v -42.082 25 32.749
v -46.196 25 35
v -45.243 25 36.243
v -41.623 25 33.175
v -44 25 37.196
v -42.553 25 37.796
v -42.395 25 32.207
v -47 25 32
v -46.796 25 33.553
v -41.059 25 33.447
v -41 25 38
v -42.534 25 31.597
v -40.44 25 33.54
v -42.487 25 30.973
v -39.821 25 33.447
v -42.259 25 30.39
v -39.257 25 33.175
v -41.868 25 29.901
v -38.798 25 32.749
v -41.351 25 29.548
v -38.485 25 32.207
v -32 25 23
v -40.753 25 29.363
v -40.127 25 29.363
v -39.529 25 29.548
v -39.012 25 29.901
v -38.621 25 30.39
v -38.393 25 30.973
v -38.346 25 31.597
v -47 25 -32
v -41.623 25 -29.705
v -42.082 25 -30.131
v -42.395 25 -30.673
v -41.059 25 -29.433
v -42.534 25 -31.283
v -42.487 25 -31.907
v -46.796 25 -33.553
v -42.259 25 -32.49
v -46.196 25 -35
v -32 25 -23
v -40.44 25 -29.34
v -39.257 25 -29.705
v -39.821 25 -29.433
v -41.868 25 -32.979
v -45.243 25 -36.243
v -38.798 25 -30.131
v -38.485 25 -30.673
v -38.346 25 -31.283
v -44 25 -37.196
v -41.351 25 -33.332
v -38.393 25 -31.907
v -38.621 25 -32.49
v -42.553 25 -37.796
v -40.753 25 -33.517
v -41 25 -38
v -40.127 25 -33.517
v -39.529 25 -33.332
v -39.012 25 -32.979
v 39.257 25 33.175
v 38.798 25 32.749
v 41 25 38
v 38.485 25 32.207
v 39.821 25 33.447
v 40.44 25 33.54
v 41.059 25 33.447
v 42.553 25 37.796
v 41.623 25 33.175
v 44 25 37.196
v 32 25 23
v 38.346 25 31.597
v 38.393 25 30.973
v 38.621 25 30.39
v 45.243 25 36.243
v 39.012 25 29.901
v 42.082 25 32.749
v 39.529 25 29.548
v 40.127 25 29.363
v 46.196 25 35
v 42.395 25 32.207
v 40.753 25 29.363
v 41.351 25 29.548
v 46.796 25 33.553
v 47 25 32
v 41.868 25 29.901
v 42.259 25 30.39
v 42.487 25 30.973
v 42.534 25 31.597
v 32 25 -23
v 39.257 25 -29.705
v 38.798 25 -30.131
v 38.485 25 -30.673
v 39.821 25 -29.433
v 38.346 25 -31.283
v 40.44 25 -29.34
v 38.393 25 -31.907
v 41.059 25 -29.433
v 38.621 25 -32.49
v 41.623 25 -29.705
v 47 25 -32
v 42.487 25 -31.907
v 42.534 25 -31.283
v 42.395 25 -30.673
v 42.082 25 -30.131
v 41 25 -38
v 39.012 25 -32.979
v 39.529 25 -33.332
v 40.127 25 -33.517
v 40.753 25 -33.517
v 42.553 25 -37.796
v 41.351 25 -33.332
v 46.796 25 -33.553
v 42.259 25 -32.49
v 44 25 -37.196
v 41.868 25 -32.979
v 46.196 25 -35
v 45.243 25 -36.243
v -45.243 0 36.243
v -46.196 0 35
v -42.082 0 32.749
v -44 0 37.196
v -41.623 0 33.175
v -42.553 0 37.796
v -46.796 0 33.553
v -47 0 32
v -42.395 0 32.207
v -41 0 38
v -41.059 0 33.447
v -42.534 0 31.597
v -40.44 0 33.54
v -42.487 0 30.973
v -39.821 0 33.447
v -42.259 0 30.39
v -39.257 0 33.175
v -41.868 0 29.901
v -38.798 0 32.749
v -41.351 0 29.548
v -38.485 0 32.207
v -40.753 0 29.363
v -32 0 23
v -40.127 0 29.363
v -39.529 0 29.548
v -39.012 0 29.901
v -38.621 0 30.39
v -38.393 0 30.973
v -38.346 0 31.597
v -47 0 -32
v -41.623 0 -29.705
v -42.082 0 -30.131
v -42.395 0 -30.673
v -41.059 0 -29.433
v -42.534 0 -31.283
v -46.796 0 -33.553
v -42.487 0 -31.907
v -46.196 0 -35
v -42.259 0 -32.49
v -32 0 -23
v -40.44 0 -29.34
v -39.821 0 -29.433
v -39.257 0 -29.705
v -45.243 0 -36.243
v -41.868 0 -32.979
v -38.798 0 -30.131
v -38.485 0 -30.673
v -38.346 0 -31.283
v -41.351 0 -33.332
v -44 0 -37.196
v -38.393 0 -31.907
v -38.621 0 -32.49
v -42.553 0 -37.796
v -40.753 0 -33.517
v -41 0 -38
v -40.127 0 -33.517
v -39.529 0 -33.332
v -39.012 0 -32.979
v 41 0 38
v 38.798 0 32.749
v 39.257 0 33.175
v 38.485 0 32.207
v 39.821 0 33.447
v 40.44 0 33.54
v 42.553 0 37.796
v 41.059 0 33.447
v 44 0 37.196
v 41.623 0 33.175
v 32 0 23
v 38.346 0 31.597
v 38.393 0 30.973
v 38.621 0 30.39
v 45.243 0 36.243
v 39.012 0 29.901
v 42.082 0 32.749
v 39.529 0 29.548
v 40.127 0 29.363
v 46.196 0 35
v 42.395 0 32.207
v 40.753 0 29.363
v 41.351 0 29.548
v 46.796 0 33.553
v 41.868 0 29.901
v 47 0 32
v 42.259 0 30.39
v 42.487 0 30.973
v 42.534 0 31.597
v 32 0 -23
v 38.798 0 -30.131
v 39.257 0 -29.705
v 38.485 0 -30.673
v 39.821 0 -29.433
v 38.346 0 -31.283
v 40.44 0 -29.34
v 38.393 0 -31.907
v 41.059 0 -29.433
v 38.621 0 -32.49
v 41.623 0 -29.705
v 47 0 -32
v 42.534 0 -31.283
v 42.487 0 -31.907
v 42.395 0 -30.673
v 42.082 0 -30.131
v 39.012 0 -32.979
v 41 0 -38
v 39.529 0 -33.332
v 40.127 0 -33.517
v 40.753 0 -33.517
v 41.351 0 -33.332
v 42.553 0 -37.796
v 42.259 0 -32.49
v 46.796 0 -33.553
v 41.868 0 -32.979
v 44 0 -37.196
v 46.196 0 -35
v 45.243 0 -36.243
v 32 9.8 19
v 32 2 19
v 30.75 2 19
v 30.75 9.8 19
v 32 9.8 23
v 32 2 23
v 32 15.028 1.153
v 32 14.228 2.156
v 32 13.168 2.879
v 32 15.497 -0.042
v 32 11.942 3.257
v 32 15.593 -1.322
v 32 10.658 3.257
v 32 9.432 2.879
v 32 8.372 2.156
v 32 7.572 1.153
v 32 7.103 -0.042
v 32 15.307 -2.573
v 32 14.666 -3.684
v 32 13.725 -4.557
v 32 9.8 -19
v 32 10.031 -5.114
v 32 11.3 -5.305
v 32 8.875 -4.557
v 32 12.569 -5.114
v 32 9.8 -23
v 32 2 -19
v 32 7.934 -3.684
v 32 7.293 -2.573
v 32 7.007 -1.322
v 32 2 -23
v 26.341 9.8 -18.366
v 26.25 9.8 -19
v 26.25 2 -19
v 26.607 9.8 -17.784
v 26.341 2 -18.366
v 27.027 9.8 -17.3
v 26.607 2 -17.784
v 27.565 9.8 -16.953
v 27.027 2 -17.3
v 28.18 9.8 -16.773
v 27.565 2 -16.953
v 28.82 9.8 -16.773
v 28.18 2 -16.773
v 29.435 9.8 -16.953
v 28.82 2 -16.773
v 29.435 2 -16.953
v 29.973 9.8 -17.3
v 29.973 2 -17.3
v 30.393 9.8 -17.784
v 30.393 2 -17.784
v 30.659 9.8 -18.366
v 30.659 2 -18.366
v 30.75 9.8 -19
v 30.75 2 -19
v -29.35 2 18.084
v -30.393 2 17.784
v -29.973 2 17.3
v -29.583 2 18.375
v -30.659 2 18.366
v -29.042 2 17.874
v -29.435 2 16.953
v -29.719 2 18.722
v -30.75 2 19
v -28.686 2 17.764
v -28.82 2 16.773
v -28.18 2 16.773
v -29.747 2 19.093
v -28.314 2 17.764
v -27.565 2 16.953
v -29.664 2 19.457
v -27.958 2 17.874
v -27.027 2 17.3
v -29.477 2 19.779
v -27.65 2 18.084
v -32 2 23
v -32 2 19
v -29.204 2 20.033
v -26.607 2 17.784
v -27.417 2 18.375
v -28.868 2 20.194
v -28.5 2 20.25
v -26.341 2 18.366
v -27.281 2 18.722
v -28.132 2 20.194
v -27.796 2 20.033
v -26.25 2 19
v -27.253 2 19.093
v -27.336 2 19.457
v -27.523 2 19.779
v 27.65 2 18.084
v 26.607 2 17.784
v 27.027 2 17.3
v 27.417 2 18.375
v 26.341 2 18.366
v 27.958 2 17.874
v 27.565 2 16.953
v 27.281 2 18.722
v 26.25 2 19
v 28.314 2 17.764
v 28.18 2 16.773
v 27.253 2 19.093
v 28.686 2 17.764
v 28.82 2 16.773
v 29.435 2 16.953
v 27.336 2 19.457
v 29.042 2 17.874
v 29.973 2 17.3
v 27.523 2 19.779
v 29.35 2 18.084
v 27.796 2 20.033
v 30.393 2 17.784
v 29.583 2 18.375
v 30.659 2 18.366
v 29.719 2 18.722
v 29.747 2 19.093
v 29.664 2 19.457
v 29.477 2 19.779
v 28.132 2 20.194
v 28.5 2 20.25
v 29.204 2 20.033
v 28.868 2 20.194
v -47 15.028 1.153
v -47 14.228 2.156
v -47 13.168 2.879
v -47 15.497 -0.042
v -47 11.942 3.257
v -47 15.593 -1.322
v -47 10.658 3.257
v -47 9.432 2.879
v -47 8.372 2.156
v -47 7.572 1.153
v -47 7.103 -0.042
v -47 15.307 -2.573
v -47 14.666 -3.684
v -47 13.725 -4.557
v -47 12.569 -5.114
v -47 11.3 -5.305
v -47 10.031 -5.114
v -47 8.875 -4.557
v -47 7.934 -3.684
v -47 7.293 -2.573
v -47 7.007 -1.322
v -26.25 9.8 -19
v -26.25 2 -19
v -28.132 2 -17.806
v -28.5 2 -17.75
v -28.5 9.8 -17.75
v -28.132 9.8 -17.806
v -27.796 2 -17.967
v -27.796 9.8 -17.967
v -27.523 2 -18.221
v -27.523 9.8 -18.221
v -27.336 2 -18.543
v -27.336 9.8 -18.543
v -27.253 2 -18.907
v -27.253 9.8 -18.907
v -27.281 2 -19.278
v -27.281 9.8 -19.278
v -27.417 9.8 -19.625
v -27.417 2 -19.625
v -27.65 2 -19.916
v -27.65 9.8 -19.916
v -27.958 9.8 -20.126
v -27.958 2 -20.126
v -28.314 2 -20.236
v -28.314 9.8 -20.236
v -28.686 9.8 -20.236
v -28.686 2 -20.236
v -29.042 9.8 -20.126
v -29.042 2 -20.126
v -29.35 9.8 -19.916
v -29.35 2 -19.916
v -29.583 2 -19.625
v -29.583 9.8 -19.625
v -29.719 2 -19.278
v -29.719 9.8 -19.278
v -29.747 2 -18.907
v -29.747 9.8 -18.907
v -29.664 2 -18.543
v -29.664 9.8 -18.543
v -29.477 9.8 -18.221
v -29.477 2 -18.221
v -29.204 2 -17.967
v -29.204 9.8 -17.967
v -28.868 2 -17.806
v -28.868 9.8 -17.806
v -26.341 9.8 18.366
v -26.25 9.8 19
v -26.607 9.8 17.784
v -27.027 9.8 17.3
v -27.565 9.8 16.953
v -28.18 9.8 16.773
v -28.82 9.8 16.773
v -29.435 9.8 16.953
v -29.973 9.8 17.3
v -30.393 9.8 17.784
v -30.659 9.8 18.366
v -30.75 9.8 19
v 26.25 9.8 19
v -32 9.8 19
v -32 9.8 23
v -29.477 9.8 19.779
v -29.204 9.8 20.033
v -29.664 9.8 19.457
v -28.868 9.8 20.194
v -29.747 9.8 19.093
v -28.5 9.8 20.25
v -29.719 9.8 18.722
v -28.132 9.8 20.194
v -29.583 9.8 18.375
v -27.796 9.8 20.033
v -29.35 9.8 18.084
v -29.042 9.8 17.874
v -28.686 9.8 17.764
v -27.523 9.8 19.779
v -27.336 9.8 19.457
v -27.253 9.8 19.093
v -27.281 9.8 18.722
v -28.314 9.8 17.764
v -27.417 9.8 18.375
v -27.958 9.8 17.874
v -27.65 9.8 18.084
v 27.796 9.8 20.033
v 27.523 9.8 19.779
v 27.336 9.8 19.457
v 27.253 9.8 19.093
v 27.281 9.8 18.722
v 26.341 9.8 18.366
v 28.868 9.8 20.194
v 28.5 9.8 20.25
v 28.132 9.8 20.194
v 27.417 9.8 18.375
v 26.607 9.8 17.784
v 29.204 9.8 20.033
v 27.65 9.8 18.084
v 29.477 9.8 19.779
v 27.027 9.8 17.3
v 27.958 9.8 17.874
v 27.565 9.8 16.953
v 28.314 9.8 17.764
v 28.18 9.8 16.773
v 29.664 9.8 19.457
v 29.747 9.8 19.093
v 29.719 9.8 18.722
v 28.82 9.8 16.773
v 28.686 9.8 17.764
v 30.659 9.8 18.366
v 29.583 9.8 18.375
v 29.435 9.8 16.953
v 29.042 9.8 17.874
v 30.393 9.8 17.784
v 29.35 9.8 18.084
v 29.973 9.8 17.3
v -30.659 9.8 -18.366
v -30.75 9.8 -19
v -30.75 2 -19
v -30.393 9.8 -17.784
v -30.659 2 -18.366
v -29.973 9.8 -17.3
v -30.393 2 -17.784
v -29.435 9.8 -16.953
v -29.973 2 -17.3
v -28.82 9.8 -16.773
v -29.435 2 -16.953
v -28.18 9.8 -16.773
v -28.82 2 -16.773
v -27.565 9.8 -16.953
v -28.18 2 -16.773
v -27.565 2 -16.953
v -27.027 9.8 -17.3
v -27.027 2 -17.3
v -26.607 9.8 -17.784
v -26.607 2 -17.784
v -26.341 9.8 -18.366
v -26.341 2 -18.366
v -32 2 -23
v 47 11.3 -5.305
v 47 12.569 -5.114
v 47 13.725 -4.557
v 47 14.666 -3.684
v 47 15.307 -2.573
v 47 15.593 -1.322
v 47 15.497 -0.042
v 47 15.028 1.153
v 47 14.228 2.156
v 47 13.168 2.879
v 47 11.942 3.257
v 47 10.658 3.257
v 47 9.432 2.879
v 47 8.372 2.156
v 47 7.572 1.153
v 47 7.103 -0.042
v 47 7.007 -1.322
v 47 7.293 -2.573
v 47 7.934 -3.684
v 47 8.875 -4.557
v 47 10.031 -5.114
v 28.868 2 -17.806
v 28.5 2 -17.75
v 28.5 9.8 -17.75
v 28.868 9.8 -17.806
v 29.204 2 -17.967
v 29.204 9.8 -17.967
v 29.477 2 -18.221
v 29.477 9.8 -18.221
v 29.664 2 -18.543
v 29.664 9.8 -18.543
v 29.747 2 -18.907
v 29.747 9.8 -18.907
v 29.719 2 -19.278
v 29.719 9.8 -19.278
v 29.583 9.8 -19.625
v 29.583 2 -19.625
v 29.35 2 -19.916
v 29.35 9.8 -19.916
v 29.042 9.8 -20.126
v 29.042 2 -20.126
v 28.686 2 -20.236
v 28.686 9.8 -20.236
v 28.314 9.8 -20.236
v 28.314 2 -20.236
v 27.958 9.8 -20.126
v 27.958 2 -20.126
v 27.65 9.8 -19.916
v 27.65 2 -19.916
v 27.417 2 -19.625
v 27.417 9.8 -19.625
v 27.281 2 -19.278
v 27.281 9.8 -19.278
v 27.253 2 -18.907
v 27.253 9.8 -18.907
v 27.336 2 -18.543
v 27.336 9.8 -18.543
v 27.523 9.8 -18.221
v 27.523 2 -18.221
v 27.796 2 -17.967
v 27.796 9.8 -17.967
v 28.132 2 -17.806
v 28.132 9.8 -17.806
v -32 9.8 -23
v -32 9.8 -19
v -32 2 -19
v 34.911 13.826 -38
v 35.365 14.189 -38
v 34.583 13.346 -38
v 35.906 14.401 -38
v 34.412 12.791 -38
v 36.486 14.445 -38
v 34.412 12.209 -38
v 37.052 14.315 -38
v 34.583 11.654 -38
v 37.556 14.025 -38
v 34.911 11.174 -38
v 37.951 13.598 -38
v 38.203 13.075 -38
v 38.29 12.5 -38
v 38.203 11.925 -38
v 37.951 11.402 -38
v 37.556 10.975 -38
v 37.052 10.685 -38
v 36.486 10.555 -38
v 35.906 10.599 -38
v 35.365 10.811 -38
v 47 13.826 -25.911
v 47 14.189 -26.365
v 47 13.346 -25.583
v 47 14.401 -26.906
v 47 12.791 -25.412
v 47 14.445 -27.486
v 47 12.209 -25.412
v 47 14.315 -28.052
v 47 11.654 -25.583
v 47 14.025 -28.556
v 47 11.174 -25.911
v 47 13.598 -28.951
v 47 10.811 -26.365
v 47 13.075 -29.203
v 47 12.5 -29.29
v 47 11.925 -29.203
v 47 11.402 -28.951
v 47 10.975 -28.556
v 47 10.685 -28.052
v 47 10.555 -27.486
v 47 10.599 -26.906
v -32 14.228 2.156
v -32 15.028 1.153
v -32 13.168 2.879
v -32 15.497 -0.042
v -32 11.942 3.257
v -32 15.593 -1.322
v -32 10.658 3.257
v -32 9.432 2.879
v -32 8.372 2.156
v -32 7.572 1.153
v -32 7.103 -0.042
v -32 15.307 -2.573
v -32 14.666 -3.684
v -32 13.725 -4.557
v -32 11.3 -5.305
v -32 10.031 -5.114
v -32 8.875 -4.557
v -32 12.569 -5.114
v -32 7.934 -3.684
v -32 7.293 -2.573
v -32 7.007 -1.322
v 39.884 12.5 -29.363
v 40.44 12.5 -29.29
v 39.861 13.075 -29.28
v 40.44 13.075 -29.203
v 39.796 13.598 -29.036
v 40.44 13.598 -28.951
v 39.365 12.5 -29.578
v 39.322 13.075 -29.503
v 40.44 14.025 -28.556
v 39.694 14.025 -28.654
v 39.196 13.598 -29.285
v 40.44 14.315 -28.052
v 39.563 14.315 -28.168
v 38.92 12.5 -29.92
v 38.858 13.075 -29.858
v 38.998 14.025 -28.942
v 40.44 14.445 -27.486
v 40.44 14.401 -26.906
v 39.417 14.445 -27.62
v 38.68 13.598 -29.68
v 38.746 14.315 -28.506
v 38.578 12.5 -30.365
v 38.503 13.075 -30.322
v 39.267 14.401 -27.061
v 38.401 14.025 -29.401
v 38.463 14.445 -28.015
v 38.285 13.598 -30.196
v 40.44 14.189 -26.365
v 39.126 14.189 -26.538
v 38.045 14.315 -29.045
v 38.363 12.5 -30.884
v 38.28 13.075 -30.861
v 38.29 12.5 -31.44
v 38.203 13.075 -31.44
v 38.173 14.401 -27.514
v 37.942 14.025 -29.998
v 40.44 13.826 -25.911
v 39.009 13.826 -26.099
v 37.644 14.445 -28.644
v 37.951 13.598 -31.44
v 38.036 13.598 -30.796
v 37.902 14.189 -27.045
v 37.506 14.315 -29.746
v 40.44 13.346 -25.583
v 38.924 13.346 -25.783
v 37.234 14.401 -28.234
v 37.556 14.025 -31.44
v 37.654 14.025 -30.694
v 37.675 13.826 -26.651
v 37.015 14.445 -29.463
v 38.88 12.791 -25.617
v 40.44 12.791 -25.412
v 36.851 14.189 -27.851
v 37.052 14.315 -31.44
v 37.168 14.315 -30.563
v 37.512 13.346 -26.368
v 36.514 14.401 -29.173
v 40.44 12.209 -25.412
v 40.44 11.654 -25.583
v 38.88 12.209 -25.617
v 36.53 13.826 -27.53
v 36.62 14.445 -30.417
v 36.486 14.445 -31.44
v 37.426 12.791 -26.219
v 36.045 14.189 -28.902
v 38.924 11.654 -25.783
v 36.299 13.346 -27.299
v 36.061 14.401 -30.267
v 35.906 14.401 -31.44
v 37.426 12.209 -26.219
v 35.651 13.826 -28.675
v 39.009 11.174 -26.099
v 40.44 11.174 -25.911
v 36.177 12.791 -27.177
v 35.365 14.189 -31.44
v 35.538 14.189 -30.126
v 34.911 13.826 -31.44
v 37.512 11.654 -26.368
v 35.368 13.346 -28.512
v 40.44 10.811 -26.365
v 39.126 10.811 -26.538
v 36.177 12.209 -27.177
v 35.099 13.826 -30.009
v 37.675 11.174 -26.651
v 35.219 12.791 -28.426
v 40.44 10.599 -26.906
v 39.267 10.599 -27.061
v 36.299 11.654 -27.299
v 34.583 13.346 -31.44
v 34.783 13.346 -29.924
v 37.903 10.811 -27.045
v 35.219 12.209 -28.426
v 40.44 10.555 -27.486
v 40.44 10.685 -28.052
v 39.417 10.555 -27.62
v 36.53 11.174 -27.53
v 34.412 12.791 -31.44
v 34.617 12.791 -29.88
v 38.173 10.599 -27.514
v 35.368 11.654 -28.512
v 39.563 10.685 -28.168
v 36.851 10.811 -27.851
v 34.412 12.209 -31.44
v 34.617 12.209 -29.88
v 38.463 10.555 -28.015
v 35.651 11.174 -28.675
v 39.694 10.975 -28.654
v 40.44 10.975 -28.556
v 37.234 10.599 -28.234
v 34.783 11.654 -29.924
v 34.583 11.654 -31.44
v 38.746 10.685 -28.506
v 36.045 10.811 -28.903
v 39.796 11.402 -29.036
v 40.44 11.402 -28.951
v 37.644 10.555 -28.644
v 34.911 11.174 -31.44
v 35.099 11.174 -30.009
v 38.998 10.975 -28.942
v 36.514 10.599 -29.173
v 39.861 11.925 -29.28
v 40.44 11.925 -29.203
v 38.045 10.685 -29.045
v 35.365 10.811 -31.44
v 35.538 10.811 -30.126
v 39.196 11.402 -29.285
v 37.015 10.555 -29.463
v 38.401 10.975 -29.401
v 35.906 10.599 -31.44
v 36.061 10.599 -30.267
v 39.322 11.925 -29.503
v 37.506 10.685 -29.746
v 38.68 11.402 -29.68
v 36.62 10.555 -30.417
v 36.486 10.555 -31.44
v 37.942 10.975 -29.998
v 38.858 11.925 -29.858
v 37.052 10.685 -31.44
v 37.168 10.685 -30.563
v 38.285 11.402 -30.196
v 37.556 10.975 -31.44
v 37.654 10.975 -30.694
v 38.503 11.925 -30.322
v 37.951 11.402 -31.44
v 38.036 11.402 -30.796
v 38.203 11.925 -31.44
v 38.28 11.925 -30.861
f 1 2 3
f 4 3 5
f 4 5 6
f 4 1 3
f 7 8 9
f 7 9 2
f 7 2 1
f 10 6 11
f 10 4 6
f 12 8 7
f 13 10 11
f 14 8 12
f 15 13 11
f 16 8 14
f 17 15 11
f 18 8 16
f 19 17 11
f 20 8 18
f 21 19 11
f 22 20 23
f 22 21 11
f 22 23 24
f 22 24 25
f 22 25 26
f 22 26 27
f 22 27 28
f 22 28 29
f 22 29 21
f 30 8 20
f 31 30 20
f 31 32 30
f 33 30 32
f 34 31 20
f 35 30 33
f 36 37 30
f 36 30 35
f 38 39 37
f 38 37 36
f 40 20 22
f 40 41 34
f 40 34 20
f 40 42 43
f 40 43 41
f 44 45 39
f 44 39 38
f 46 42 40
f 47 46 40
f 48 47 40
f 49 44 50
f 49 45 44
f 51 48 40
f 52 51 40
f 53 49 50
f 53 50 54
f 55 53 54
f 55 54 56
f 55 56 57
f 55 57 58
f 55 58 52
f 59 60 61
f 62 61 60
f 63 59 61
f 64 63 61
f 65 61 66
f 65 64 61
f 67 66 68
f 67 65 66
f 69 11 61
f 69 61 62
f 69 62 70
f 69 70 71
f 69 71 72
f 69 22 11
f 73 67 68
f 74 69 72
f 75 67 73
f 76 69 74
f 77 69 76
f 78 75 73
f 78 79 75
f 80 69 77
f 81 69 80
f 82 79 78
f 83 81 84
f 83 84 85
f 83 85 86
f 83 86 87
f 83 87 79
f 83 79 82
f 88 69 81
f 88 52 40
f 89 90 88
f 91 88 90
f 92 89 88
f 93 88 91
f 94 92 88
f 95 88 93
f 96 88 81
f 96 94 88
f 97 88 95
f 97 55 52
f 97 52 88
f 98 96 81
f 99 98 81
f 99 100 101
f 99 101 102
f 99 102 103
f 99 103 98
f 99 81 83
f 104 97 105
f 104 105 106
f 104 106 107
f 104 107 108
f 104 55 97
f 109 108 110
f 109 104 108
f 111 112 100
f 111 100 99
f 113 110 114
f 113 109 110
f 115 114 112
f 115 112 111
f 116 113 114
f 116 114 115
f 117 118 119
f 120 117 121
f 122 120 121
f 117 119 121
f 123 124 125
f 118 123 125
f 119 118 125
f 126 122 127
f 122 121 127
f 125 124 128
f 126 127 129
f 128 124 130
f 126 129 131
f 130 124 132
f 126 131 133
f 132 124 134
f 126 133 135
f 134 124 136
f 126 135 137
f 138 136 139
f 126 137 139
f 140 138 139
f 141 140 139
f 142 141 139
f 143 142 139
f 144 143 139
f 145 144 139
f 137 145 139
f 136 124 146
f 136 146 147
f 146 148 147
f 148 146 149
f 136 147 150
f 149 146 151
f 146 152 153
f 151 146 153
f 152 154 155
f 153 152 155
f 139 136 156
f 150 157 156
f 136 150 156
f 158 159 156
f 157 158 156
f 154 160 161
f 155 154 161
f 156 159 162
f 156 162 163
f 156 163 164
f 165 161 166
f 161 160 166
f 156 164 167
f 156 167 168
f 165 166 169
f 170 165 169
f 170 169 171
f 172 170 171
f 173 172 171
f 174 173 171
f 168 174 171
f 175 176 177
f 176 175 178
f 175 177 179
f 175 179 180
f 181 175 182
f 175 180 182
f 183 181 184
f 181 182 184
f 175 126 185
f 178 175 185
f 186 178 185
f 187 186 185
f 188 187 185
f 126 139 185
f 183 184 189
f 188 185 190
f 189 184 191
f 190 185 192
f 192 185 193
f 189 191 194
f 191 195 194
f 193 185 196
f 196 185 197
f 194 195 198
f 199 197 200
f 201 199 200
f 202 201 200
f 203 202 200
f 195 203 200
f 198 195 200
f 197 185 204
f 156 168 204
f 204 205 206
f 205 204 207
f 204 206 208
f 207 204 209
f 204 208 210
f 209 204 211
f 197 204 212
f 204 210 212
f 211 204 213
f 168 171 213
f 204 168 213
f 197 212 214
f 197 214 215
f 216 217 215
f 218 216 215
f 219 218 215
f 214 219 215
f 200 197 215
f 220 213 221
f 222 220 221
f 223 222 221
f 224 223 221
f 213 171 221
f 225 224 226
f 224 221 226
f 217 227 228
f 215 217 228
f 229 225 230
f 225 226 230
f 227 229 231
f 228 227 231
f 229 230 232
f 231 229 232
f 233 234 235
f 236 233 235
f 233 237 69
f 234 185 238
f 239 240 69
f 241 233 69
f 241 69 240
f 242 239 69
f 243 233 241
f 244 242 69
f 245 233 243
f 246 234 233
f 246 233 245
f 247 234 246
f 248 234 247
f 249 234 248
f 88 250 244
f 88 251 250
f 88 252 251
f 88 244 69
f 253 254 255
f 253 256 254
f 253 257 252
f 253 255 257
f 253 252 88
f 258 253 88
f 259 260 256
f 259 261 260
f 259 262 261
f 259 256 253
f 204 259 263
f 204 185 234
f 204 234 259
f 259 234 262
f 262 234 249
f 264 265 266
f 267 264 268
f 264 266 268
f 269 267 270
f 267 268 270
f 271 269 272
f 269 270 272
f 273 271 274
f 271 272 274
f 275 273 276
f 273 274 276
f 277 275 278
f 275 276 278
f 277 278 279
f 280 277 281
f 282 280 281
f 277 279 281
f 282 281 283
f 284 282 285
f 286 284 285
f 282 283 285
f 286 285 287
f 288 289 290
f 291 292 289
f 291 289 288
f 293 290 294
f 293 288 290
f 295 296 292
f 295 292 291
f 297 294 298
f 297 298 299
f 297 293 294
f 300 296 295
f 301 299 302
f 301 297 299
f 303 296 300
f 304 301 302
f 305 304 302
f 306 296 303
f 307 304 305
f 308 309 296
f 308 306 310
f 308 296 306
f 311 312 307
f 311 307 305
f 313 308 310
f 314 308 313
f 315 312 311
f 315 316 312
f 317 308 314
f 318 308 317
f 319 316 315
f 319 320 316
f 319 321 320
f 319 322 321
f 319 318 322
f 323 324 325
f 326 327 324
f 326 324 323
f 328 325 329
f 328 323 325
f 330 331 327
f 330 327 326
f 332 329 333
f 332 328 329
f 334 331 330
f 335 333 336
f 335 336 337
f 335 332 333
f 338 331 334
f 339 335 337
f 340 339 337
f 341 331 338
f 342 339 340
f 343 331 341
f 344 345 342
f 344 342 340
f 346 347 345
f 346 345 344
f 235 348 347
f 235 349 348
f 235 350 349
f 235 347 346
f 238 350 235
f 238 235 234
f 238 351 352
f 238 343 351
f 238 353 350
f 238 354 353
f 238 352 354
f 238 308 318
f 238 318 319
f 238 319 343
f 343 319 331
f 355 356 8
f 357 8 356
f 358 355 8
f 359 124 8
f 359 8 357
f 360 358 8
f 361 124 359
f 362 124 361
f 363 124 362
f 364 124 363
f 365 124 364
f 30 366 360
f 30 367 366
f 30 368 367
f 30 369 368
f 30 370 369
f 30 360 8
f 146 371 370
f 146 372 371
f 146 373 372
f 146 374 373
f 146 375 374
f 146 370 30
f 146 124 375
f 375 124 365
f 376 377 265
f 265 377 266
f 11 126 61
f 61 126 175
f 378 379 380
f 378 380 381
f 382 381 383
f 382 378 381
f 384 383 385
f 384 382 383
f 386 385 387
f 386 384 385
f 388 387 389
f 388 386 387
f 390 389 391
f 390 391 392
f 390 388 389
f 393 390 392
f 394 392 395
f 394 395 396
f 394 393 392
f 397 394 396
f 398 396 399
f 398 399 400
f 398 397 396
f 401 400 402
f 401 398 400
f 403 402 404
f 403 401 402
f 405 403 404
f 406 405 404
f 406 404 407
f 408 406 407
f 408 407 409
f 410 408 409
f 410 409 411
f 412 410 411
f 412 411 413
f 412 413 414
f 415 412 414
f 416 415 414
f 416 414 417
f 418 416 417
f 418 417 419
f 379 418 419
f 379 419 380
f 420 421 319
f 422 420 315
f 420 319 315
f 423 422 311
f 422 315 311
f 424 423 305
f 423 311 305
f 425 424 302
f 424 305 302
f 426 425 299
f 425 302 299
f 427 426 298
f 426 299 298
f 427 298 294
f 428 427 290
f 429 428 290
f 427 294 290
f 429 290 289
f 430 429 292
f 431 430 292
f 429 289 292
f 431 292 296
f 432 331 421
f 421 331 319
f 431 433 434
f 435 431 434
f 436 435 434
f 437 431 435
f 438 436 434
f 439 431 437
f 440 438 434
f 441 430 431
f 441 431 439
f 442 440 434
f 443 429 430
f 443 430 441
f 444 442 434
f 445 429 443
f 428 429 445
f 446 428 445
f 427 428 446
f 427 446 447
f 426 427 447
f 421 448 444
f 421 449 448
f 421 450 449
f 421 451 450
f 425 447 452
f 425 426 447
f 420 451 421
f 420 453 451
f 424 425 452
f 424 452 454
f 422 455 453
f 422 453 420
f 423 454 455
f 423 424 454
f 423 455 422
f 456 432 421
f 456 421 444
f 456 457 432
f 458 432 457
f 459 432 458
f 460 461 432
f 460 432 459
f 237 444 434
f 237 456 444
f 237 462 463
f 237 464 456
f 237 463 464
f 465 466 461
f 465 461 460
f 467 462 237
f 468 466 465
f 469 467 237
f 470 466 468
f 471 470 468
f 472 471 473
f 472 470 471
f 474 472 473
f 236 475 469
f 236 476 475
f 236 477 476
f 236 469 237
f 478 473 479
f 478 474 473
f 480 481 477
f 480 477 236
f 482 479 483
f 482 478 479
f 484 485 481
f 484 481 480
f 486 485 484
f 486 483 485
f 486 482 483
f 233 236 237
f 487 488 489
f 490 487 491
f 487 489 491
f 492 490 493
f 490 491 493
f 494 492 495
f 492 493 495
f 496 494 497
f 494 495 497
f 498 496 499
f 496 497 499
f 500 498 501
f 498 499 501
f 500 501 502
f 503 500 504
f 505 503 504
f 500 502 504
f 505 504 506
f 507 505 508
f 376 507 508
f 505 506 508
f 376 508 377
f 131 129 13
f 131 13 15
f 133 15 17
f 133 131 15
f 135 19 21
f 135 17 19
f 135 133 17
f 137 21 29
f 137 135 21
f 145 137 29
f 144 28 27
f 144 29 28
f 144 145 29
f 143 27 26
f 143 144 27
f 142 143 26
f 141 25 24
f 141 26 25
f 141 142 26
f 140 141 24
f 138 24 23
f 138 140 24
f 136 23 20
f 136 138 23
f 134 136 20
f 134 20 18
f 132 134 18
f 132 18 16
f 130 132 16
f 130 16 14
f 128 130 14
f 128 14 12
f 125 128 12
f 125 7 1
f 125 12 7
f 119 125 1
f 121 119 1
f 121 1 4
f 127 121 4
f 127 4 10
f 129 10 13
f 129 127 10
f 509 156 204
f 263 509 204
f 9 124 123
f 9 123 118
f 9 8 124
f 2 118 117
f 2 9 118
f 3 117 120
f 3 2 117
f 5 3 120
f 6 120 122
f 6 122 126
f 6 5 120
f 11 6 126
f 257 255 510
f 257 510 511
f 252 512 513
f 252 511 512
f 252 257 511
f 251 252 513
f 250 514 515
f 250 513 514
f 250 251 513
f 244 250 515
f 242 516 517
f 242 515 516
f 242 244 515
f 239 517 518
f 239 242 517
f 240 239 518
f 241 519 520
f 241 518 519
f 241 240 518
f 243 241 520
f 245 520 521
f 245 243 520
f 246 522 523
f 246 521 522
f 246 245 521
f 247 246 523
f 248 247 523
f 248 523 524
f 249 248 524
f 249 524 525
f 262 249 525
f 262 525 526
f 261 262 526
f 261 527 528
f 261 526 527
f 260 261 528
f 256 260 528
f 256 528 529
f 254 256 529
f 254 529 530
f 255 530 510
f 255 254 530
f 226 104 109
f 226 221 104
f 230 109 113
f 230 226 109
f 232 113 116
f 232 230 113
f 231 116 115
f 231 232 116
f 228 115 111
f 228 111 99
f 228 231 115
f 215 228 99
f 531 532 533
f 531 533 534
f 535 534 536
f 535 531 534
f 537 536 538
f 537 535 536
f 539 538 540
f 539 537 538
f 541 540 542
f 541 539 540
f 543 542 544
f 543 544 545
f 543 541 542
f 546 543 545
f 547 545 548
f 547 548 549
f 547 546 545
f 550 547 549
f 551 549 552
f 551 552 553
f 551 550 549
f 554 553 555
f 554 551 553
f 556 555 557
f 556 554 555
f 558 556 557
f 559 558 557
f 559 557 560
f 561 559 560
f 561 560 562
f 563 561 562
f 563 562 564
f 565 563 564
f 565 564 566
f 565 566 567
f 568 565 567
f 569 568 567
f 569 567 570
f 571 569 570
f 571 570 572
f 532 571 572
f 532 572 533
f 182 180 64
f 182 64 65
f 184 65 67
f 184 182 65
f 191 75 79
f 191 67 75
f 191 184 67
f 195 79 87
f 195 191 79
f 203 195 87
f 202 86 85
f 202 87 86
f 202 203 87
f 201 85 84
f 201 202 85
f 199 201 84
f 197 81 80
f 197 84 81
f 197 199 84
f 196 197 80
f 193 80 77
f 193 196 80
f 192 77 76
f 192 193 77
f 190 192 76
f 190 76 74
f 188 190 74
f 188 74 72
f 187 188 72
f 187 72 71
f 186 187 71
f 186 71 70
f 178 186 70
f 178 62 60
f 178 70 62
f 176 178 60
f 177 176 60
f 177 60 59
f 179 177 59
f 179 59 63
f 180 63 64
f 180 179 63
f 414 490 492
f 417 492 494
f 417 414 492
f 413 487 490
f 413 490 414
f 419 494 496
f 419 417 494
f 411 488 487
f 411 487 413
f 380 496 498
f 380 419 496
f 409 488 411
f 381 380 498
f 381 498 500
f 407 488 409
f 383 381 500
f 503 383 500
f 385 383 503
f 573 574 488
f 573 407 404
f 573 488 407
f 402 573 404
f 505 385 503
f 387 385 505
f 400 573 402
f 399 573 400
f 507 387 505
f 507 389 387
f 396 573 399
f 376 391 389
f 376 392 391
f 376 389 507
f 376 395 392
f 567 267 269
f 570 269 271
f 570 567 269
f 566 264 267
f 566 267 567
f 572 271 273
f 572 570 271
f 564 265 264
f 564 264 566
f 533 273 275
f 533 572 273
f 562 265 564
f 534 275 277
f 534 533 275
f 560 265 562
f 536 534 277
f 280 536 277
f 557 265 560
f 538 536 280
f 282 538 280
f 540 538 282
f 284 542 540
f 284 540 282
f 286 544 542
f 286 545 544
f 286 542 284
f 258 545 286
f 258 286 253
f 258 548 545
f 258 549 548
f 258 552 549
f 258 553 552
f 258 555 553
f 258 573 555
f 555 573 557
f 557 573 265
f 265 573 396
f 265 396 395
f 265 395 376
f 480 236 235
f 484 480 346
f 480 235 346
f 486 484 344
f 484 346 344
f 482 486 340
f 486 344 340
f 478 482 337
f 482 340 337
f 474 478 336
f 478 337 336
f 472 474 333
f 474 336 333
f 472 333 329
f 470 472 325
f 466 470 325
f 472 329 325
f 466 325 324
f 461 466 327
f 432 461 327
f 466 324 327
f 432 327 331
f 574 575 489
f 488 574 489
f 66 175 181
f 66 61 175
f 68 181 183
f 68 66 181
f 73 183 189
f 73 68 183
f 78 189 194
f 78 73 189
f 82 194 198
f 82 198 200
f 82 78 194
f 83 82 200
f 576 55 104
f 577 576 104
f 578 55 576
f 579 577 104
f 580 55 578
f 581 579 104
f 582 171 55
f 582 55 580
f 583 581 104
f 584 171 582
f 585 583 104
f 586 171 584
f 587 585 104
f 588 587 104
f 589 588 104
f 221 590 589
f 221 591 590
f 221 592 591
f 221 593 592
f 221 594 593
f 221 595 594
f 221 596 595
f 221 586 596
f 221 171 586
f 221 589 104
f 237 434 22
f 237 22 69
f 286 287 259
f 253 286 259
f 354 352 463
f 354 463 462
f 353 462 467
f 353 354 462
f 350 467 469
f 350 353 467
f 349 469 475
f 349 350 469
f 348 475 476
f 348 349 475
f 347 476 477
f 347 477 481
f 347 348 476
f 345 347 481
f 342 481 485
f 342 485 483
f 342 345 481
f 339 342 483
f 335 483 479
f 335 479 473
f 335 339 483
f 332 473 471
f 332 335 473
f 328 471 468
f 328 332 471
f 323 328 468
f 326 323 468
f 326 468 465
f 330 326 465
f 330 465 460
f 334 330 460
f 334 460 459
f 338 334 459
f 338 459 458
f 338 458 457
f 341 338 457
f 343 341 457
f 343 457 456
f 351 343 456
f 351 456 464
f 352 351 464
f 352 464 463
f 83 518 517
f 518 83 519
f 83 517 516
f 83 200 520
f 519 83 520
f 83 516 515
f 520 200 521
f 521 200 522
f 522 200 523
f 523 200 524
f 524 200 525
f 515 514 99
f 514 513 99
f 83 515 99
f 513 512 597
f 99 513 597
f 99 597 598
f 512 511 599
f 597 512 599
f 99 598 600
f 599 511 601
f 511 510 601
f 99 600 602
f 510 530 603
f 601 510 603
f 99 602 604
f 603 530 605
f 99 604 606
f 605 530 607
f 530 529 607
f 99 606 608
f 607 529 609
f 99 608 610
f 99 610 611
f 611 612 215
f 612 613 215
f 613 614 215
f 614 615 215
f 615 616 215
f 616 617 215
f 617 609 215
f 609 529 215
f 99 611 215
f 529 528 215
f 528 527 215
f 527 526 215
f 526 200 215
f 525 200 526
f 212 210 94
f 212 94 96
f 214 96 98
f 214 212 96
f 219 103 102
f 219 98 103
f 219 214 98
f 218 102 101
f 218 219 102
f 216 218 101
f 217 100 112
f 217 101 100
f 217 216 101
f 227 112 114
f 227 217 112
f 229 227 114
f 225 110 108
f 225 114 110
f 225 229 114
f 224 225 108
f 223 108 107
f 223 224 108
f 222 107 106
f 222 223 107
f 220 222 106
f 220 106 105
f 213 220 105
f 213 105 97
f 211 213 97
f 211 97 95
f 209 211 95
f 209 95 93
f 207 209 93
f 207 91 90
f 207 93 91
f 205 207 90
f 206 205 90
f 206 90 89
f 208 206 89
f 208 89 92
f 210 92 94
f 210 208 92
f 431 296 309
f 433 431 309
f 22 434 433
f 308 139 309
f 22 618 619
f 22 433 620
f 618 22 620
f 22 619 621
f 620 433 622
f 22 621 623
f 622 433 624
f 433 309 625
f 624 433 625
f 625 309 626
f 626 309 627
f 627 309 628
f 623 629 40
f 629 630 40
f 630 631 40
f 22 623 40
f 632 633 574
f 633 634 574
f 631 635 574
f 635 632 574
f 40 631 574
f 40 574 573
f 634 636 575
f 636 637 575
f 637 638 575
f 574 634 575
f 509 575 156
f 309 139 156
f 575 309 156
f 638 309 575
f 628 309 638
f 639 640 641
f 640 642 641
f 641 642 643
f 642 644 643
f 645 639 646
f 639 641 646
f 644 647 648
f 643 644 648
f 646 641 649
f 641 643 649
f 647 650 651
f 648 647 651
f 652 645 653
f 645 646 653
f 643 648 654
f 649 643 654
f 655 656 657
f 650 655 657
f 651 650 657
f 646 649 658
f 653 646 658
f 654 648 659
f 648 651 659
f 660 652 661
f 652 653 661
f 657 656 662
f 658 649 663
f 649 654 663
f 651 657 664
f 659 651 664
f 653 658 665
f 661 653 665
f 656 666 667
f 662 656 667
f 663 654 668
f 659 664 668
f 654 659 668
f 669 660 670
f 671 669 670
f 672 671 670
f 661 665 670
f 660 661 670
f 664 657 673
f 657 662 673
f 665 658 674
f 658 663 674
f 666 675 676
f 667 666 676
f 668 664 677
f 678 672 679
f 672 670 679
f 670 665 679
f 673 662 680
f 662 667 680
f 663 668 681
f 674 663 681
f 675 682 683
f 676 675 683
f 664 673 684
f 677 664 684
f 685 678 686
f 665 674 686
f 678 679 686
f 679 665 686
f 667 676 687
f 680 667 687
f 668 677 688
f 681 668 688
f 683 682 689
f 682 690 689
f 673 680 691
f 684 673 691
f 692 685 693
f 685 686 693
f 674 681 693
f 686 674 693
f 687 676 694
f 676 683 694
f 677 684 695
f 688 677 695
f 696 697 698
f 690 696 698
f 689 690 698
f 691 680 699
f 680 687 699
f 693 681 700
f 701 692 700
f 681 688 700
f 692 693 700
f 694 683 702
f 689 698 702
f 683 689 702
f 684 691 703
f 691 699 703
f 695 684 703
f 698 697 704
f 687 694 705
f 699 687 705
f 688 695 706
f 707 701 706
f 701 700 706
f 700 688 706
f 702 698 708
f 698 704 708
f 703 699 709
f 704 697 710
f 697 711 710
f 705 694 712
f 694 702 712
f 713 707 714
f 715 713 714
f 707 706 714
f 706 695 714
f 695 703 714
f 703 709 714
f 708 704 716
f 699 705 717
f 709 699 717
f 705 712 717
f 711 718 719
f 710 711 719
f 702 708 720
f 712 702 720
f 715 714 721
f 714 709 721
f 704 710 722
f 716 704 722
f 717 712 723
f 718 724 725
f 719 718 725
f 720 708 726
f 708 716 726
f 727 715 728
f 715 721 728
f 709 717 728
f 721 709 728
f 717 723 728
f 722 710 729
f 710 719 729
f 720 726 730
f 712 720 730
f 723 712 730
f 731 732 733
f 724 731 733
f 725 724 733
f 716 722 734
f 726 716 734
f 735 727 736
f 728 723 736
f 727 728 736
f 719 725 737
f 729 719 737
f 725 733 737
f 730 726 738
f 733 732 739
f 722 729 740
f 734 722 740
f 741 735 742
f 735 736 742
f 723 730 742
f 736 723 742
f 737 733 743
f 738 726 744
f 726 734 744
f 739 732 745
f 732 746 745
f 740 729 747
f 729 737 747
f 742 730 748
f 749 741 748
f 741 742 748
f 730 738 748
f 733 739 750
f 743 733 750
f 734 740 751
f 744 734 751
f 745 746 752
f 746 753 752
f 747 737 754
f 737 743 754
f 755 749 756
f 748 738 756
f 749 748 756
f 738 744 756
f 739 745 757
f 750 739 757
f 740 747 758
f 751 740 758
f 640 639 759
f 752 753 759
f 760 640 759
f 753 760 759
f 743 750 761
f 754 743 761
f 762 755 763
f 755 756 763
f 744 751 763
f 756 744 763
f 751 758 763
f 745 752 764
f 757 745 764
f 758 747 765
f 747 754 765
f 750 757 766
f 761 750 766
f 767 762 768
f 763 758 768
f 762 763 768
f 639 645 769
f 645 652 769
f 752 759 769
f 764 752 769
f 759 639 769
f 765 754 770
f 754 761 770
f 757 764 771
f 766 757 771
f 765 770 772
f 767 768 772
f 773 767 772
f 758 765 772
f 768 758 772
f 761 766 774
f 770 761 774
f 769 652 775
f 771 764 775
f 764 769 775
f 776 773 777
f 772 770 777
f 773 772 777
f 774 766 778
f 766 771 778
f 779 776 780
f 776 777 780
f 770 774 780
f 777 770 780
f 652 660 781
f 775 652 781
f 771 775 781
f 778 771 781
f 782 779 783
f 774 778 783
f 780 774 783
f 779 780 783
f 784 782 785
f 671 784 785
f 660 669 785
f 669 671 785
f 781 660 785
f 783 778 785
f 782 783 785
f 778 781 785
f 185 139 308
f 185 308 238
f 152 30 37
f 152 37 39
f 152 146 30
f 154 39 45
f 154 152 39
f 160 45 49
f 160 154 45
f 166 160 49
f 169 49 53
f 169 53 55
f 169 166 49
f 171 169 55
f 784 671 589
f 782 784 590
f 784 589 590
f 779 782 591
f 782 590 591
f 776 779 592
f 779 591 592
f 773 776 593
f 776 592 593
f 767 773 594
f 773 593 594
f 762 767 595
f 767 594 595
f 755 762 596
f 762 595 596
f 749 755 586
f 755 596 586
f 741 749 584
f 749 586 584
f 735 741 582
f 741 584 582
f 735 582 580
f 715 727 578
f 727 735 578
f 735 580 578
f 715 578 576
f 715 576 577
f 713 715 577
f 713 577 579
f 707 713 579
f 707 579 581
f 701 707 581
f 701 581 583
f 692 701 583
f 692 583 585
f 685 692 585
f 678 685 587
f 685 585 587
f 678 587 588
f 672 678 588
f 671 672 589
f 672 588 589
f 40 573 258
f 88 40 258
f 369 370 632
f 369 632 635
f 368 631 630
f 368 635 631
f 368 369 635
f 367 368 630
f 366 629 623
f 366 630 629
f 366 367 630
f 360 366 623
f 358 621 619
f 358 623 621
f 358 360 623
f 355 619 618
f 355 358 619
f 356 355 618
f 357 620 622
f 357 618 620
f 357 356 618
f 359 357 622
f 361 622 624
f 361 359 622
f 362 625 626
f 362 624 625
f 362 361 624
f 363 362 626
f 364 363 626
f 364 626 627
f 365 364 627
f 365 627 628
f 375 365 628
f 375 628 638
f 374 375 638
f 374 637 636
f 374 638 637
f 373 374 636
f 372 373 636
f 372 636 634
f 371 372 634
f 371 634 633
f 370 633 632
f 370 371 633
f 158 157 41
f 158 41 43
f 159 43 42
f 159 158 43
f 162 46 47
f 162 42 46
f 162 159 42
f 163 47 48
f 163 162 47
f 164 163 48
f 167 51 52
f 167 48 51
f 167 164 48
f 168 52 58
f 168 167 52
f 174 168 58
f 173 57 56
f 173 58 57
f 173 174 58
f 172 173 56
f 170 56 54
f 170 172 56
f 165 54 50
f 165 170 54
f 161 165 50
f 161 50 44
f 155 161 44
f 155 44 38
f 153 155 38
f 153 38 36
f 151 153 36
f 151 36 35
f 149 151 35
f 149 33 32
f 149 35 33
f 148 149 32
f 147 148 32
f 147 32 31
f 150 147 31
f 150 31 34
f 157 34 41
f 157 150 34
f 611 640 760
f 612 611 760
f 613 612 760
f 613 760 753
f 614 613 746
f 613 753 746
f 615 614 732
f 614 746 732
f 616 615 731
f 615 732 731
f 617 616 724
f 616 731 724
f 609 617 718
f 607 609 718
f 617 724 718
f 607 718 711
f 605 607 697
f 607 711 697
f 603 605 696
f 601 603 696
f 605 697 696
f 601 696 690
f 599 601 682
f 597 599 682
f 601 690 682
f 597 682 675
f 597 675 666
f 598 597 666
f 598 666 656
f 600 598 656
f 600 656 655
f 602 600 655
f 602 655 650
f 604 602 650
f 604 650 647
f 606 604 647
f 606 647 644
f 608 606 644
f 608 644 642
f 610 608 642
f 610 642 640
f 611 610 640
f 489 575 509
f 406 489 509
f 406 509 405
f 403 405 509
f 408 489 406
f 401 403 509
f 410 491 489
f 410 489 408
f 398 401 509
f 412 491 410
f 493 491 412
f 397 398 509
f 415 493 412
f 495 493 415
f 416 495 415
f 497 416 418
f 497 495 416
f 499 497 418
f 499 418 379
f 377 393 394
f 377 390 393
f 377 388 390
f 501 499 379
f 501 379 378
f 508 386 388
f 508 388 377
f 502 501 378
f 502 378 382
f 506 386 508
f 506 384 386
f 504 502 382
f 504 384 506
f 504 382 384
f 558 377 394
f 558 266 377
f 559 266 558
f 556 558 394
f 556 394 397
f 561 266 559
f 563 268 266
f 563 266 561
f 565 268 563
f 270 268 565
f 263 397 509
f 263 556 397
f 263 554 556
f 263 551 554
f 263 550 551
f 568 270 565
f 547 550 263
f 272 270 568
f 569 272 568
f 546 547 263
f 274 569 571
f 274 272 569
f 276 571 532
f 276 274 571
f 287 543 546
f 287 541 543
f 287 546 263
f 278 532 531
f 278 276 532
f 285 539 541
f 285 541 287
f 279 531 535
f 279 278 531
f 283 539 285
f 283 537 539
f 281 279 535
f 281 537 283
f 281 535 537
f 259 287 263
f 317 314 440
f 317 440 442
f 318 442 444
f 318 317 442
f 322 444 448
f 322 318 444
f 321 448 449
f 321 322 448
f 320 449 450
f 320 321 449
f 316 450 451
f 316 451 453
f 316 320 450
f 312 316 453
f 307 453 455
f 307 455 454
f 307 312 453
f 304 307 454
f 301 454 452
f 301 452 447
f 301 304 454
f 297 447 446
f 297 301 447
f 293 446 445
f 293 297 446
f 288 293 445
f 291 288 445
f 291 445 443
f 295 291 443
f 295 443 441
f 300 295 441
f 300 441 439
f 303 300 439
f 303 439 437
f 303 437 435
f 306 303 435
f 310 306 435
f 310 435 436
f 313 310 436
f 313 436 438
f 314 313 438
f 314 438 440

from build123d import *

# Parameters (mm, degrees)
SKETCH1_W               = 94
SKETCH1_H               = 76
SKETCH1_R               = 1.25
BOSS_EXTRUDE1_DEPTH     = 9.8
SKETCH2_W               = 94
SKETCH2_H               = 76
SKETCH2_W_2             = 64
SKETCH2_H_2             = 46
BOSS_EXTRUDE3_DEPTH     = 15.2
SKETCH3_W               = 64
SKETCH3_H               = 46
CUT_EXTRUDE1_DEPTH      = 2
CUT_EXTRUDE2_DEPTH      = 105.427008001
CUT_EXTRUDE2_DEPTH_BACK = 105.427008001
SKETCH4_R               = 4.305
CUT_EXTRUDE3_DEPTH      = 66.406421703
CUT_EXTRUDE3_DEPTH_BACK = 66.406421703
SKETCH5_R               = 2.1
FILLET1_R               = 6
CUT_SWEEP_PROFILE_R     = 1.95


with BuildPart() as part:
    # Sketch1 → Boss-Extrude1 (new body)
    with BuildSketch(Plane(origin=(0, 0, 0), x_dir=(1, 0, 0), z_dir=(0, 1, 0))):
        Rectangle(SKETCH1_W, SKETCH1_H)
        with BuildLine():
            Line((-32, 19), (-30.75, 19))
            ThreePointArc((-30.75, 19), (-28.5, 16.75), (-26.25, 19))
            Line((-26.25, 19), (26.25, 19))
            ThreePointArc((26.25, 19), (28.5, 16.75), (30.75, 19))
            Line((30.75, 19), (32, 19))
            Line((32, 19), (32, -19))
            Line((32, -19), (30.75, -19))
            ThreePointArc((30.75, -19), (28.5, -16.75), (26.25, -19))
            Line((26.25, -19), (-26.25, -19))
            ThreePointArc((-26.25, -19), (-28.5, -16.75), (-30.75, -19))
            Line((-30.75, -19), (-32, -19))
            Line((-32, -19), (-32, 19))
        make_face(mode=Mode.SUBTRACT)
        with Locations(Location((-28.5, 19, 0), (0, 0, 270))):
            Circle(SKETCH1_R, mode=Mode.SUBTRACT)
        with Locations(Location((28.5, 19, 0), (0, 0, 270))):
            Circle(SKETCH1_R, mode=Mode.SUBTRACT)
        with Locations(Location((28.5, -19, 0), (0, 0, 270))):
            Circle(SKETCH1_R, mode=Mode.SUBTRACT)
        with Locations(Location((-28.5, -19, 0), (0, 0, 270))):
            Circle(SKETCH1_R, mode=Mode.SUBTRACT)
    extrude(amount=BOSS_EXTRUDE1_DEPTH)

    # Sketch2 → Boss-Extrude3 (add)
    with BuildSketch(Plane(origin=(0, 9.8, 0), x_dir=(1, 0, 0), z_dir=(0, 1, 0))):
        Rectangle(SKETCH2_W, SKETCH2_H)
        Rectangle(SKETCH2_W_2, SKETCH2_H_2, mode=Mode.SUBTRACT)
    extrude(amount=BOSS_EXTRUDE3_DEPTH)

    # Sketch3 → Cut-Extrude1 (cut)
    with BuildSketch(Plane.XZ):
        Rectangle(SKETCH3_W, SKETCH3_H)
    extrude(amount=-CUT_EXTRUDE1_DEPTH, mode=Mode.SUBTRACT)

    # Sketch4 → Cut-Extrude2 (cut, two sides: drawn at the far end of the back side and taken through both)
    with BuildSketch(Plane(origin=(47, 0, 0), x_dir=(0, 0, -1), z_dir=(1, 0, 0)).offset(-CUT_EXTRUDE2_DEPTH_BACK)):
        with Locations((1, 11.3)):
            Circle(SKETCH4_R)
    extrude(amount=CUT_EXTRUDE2_DEPTH + CUT_EXTRUDE2_DEPTH_BACK, mode=Mode.SUBTRACT)

    # Sketch5 → Cut-Extrude3 (cut, two sides: drawn at the far end of the back side and taken through both)
    with BuildSketch(Plane(origin=(0, 25, 0), x_dir=(1, 0, 0), z_dir=(0, 1, 0)).offset(-CUT_EXTRUDE3_DEPTH_BACK)):
        with Locations(Location((-40.44, 31.44, 0), (0, 0, 270))):
            Circle(SKETCH5_R)
        with Locations(Location((40.44, 31.44, 0), (0, 0, 270))):
            Circle(SKETCH5_R)
        with Locations(Location((40.44, -31.44, 0), (0, 0, 270))):
            Circle(SKETCH5_R)
        with Locations(Location((-40.44, -31.44, 0), (0, 0, 270))):
            Circle(SKETCH5_R)
    extrude(amount=CUT_EXTRUDE3_DEPTH + CUT_EXTRUDE3_DEPTH_BACK, mode=Mode.SUBTRACT)

    # Fillet1
    fillet1_edges = [part.edges().sort_by_distance(p)[0] for p in [
        (-47, 12.5, 38),
        (-47, 12.5, -38),
        (47, 12.5, -38),
        (47, 12.5, 38),
    ]]
    fillet(fillet1_edges, radius=FILLET1_R)

    # Cut-Sweep: sweep along a path in Sketch9
    with BuildLine(Plane(origin=(0, 12.5, 0), x_dir=(-1, 0, 0), z_dir=(0, -1, 0))) as cut_sweep_path:
        Line((-47, 27.34), (-40.44, 27.34))
        ThreePointArc((-40.44, 27.34), (-37.540862197, 28.540862197), (-36.34, 31.44))
        Line((-36.34, 31.44), (-36.34, 38))
    # Cut-Sweep profile (on start of the path) → Cut-Sweep (sweep, cut)
    with BuildSketch(Plane(origin=(47, 12.5, -27.34), x_dir=(0, 0, -1), z_dir=(-1, 0, 0))):
        Circle(CUT_SWEEP_PROFILE_R)
    sweep(path=cut_sweep_path.line, mode=Mode.SUBTRACT)


solid = part.part
